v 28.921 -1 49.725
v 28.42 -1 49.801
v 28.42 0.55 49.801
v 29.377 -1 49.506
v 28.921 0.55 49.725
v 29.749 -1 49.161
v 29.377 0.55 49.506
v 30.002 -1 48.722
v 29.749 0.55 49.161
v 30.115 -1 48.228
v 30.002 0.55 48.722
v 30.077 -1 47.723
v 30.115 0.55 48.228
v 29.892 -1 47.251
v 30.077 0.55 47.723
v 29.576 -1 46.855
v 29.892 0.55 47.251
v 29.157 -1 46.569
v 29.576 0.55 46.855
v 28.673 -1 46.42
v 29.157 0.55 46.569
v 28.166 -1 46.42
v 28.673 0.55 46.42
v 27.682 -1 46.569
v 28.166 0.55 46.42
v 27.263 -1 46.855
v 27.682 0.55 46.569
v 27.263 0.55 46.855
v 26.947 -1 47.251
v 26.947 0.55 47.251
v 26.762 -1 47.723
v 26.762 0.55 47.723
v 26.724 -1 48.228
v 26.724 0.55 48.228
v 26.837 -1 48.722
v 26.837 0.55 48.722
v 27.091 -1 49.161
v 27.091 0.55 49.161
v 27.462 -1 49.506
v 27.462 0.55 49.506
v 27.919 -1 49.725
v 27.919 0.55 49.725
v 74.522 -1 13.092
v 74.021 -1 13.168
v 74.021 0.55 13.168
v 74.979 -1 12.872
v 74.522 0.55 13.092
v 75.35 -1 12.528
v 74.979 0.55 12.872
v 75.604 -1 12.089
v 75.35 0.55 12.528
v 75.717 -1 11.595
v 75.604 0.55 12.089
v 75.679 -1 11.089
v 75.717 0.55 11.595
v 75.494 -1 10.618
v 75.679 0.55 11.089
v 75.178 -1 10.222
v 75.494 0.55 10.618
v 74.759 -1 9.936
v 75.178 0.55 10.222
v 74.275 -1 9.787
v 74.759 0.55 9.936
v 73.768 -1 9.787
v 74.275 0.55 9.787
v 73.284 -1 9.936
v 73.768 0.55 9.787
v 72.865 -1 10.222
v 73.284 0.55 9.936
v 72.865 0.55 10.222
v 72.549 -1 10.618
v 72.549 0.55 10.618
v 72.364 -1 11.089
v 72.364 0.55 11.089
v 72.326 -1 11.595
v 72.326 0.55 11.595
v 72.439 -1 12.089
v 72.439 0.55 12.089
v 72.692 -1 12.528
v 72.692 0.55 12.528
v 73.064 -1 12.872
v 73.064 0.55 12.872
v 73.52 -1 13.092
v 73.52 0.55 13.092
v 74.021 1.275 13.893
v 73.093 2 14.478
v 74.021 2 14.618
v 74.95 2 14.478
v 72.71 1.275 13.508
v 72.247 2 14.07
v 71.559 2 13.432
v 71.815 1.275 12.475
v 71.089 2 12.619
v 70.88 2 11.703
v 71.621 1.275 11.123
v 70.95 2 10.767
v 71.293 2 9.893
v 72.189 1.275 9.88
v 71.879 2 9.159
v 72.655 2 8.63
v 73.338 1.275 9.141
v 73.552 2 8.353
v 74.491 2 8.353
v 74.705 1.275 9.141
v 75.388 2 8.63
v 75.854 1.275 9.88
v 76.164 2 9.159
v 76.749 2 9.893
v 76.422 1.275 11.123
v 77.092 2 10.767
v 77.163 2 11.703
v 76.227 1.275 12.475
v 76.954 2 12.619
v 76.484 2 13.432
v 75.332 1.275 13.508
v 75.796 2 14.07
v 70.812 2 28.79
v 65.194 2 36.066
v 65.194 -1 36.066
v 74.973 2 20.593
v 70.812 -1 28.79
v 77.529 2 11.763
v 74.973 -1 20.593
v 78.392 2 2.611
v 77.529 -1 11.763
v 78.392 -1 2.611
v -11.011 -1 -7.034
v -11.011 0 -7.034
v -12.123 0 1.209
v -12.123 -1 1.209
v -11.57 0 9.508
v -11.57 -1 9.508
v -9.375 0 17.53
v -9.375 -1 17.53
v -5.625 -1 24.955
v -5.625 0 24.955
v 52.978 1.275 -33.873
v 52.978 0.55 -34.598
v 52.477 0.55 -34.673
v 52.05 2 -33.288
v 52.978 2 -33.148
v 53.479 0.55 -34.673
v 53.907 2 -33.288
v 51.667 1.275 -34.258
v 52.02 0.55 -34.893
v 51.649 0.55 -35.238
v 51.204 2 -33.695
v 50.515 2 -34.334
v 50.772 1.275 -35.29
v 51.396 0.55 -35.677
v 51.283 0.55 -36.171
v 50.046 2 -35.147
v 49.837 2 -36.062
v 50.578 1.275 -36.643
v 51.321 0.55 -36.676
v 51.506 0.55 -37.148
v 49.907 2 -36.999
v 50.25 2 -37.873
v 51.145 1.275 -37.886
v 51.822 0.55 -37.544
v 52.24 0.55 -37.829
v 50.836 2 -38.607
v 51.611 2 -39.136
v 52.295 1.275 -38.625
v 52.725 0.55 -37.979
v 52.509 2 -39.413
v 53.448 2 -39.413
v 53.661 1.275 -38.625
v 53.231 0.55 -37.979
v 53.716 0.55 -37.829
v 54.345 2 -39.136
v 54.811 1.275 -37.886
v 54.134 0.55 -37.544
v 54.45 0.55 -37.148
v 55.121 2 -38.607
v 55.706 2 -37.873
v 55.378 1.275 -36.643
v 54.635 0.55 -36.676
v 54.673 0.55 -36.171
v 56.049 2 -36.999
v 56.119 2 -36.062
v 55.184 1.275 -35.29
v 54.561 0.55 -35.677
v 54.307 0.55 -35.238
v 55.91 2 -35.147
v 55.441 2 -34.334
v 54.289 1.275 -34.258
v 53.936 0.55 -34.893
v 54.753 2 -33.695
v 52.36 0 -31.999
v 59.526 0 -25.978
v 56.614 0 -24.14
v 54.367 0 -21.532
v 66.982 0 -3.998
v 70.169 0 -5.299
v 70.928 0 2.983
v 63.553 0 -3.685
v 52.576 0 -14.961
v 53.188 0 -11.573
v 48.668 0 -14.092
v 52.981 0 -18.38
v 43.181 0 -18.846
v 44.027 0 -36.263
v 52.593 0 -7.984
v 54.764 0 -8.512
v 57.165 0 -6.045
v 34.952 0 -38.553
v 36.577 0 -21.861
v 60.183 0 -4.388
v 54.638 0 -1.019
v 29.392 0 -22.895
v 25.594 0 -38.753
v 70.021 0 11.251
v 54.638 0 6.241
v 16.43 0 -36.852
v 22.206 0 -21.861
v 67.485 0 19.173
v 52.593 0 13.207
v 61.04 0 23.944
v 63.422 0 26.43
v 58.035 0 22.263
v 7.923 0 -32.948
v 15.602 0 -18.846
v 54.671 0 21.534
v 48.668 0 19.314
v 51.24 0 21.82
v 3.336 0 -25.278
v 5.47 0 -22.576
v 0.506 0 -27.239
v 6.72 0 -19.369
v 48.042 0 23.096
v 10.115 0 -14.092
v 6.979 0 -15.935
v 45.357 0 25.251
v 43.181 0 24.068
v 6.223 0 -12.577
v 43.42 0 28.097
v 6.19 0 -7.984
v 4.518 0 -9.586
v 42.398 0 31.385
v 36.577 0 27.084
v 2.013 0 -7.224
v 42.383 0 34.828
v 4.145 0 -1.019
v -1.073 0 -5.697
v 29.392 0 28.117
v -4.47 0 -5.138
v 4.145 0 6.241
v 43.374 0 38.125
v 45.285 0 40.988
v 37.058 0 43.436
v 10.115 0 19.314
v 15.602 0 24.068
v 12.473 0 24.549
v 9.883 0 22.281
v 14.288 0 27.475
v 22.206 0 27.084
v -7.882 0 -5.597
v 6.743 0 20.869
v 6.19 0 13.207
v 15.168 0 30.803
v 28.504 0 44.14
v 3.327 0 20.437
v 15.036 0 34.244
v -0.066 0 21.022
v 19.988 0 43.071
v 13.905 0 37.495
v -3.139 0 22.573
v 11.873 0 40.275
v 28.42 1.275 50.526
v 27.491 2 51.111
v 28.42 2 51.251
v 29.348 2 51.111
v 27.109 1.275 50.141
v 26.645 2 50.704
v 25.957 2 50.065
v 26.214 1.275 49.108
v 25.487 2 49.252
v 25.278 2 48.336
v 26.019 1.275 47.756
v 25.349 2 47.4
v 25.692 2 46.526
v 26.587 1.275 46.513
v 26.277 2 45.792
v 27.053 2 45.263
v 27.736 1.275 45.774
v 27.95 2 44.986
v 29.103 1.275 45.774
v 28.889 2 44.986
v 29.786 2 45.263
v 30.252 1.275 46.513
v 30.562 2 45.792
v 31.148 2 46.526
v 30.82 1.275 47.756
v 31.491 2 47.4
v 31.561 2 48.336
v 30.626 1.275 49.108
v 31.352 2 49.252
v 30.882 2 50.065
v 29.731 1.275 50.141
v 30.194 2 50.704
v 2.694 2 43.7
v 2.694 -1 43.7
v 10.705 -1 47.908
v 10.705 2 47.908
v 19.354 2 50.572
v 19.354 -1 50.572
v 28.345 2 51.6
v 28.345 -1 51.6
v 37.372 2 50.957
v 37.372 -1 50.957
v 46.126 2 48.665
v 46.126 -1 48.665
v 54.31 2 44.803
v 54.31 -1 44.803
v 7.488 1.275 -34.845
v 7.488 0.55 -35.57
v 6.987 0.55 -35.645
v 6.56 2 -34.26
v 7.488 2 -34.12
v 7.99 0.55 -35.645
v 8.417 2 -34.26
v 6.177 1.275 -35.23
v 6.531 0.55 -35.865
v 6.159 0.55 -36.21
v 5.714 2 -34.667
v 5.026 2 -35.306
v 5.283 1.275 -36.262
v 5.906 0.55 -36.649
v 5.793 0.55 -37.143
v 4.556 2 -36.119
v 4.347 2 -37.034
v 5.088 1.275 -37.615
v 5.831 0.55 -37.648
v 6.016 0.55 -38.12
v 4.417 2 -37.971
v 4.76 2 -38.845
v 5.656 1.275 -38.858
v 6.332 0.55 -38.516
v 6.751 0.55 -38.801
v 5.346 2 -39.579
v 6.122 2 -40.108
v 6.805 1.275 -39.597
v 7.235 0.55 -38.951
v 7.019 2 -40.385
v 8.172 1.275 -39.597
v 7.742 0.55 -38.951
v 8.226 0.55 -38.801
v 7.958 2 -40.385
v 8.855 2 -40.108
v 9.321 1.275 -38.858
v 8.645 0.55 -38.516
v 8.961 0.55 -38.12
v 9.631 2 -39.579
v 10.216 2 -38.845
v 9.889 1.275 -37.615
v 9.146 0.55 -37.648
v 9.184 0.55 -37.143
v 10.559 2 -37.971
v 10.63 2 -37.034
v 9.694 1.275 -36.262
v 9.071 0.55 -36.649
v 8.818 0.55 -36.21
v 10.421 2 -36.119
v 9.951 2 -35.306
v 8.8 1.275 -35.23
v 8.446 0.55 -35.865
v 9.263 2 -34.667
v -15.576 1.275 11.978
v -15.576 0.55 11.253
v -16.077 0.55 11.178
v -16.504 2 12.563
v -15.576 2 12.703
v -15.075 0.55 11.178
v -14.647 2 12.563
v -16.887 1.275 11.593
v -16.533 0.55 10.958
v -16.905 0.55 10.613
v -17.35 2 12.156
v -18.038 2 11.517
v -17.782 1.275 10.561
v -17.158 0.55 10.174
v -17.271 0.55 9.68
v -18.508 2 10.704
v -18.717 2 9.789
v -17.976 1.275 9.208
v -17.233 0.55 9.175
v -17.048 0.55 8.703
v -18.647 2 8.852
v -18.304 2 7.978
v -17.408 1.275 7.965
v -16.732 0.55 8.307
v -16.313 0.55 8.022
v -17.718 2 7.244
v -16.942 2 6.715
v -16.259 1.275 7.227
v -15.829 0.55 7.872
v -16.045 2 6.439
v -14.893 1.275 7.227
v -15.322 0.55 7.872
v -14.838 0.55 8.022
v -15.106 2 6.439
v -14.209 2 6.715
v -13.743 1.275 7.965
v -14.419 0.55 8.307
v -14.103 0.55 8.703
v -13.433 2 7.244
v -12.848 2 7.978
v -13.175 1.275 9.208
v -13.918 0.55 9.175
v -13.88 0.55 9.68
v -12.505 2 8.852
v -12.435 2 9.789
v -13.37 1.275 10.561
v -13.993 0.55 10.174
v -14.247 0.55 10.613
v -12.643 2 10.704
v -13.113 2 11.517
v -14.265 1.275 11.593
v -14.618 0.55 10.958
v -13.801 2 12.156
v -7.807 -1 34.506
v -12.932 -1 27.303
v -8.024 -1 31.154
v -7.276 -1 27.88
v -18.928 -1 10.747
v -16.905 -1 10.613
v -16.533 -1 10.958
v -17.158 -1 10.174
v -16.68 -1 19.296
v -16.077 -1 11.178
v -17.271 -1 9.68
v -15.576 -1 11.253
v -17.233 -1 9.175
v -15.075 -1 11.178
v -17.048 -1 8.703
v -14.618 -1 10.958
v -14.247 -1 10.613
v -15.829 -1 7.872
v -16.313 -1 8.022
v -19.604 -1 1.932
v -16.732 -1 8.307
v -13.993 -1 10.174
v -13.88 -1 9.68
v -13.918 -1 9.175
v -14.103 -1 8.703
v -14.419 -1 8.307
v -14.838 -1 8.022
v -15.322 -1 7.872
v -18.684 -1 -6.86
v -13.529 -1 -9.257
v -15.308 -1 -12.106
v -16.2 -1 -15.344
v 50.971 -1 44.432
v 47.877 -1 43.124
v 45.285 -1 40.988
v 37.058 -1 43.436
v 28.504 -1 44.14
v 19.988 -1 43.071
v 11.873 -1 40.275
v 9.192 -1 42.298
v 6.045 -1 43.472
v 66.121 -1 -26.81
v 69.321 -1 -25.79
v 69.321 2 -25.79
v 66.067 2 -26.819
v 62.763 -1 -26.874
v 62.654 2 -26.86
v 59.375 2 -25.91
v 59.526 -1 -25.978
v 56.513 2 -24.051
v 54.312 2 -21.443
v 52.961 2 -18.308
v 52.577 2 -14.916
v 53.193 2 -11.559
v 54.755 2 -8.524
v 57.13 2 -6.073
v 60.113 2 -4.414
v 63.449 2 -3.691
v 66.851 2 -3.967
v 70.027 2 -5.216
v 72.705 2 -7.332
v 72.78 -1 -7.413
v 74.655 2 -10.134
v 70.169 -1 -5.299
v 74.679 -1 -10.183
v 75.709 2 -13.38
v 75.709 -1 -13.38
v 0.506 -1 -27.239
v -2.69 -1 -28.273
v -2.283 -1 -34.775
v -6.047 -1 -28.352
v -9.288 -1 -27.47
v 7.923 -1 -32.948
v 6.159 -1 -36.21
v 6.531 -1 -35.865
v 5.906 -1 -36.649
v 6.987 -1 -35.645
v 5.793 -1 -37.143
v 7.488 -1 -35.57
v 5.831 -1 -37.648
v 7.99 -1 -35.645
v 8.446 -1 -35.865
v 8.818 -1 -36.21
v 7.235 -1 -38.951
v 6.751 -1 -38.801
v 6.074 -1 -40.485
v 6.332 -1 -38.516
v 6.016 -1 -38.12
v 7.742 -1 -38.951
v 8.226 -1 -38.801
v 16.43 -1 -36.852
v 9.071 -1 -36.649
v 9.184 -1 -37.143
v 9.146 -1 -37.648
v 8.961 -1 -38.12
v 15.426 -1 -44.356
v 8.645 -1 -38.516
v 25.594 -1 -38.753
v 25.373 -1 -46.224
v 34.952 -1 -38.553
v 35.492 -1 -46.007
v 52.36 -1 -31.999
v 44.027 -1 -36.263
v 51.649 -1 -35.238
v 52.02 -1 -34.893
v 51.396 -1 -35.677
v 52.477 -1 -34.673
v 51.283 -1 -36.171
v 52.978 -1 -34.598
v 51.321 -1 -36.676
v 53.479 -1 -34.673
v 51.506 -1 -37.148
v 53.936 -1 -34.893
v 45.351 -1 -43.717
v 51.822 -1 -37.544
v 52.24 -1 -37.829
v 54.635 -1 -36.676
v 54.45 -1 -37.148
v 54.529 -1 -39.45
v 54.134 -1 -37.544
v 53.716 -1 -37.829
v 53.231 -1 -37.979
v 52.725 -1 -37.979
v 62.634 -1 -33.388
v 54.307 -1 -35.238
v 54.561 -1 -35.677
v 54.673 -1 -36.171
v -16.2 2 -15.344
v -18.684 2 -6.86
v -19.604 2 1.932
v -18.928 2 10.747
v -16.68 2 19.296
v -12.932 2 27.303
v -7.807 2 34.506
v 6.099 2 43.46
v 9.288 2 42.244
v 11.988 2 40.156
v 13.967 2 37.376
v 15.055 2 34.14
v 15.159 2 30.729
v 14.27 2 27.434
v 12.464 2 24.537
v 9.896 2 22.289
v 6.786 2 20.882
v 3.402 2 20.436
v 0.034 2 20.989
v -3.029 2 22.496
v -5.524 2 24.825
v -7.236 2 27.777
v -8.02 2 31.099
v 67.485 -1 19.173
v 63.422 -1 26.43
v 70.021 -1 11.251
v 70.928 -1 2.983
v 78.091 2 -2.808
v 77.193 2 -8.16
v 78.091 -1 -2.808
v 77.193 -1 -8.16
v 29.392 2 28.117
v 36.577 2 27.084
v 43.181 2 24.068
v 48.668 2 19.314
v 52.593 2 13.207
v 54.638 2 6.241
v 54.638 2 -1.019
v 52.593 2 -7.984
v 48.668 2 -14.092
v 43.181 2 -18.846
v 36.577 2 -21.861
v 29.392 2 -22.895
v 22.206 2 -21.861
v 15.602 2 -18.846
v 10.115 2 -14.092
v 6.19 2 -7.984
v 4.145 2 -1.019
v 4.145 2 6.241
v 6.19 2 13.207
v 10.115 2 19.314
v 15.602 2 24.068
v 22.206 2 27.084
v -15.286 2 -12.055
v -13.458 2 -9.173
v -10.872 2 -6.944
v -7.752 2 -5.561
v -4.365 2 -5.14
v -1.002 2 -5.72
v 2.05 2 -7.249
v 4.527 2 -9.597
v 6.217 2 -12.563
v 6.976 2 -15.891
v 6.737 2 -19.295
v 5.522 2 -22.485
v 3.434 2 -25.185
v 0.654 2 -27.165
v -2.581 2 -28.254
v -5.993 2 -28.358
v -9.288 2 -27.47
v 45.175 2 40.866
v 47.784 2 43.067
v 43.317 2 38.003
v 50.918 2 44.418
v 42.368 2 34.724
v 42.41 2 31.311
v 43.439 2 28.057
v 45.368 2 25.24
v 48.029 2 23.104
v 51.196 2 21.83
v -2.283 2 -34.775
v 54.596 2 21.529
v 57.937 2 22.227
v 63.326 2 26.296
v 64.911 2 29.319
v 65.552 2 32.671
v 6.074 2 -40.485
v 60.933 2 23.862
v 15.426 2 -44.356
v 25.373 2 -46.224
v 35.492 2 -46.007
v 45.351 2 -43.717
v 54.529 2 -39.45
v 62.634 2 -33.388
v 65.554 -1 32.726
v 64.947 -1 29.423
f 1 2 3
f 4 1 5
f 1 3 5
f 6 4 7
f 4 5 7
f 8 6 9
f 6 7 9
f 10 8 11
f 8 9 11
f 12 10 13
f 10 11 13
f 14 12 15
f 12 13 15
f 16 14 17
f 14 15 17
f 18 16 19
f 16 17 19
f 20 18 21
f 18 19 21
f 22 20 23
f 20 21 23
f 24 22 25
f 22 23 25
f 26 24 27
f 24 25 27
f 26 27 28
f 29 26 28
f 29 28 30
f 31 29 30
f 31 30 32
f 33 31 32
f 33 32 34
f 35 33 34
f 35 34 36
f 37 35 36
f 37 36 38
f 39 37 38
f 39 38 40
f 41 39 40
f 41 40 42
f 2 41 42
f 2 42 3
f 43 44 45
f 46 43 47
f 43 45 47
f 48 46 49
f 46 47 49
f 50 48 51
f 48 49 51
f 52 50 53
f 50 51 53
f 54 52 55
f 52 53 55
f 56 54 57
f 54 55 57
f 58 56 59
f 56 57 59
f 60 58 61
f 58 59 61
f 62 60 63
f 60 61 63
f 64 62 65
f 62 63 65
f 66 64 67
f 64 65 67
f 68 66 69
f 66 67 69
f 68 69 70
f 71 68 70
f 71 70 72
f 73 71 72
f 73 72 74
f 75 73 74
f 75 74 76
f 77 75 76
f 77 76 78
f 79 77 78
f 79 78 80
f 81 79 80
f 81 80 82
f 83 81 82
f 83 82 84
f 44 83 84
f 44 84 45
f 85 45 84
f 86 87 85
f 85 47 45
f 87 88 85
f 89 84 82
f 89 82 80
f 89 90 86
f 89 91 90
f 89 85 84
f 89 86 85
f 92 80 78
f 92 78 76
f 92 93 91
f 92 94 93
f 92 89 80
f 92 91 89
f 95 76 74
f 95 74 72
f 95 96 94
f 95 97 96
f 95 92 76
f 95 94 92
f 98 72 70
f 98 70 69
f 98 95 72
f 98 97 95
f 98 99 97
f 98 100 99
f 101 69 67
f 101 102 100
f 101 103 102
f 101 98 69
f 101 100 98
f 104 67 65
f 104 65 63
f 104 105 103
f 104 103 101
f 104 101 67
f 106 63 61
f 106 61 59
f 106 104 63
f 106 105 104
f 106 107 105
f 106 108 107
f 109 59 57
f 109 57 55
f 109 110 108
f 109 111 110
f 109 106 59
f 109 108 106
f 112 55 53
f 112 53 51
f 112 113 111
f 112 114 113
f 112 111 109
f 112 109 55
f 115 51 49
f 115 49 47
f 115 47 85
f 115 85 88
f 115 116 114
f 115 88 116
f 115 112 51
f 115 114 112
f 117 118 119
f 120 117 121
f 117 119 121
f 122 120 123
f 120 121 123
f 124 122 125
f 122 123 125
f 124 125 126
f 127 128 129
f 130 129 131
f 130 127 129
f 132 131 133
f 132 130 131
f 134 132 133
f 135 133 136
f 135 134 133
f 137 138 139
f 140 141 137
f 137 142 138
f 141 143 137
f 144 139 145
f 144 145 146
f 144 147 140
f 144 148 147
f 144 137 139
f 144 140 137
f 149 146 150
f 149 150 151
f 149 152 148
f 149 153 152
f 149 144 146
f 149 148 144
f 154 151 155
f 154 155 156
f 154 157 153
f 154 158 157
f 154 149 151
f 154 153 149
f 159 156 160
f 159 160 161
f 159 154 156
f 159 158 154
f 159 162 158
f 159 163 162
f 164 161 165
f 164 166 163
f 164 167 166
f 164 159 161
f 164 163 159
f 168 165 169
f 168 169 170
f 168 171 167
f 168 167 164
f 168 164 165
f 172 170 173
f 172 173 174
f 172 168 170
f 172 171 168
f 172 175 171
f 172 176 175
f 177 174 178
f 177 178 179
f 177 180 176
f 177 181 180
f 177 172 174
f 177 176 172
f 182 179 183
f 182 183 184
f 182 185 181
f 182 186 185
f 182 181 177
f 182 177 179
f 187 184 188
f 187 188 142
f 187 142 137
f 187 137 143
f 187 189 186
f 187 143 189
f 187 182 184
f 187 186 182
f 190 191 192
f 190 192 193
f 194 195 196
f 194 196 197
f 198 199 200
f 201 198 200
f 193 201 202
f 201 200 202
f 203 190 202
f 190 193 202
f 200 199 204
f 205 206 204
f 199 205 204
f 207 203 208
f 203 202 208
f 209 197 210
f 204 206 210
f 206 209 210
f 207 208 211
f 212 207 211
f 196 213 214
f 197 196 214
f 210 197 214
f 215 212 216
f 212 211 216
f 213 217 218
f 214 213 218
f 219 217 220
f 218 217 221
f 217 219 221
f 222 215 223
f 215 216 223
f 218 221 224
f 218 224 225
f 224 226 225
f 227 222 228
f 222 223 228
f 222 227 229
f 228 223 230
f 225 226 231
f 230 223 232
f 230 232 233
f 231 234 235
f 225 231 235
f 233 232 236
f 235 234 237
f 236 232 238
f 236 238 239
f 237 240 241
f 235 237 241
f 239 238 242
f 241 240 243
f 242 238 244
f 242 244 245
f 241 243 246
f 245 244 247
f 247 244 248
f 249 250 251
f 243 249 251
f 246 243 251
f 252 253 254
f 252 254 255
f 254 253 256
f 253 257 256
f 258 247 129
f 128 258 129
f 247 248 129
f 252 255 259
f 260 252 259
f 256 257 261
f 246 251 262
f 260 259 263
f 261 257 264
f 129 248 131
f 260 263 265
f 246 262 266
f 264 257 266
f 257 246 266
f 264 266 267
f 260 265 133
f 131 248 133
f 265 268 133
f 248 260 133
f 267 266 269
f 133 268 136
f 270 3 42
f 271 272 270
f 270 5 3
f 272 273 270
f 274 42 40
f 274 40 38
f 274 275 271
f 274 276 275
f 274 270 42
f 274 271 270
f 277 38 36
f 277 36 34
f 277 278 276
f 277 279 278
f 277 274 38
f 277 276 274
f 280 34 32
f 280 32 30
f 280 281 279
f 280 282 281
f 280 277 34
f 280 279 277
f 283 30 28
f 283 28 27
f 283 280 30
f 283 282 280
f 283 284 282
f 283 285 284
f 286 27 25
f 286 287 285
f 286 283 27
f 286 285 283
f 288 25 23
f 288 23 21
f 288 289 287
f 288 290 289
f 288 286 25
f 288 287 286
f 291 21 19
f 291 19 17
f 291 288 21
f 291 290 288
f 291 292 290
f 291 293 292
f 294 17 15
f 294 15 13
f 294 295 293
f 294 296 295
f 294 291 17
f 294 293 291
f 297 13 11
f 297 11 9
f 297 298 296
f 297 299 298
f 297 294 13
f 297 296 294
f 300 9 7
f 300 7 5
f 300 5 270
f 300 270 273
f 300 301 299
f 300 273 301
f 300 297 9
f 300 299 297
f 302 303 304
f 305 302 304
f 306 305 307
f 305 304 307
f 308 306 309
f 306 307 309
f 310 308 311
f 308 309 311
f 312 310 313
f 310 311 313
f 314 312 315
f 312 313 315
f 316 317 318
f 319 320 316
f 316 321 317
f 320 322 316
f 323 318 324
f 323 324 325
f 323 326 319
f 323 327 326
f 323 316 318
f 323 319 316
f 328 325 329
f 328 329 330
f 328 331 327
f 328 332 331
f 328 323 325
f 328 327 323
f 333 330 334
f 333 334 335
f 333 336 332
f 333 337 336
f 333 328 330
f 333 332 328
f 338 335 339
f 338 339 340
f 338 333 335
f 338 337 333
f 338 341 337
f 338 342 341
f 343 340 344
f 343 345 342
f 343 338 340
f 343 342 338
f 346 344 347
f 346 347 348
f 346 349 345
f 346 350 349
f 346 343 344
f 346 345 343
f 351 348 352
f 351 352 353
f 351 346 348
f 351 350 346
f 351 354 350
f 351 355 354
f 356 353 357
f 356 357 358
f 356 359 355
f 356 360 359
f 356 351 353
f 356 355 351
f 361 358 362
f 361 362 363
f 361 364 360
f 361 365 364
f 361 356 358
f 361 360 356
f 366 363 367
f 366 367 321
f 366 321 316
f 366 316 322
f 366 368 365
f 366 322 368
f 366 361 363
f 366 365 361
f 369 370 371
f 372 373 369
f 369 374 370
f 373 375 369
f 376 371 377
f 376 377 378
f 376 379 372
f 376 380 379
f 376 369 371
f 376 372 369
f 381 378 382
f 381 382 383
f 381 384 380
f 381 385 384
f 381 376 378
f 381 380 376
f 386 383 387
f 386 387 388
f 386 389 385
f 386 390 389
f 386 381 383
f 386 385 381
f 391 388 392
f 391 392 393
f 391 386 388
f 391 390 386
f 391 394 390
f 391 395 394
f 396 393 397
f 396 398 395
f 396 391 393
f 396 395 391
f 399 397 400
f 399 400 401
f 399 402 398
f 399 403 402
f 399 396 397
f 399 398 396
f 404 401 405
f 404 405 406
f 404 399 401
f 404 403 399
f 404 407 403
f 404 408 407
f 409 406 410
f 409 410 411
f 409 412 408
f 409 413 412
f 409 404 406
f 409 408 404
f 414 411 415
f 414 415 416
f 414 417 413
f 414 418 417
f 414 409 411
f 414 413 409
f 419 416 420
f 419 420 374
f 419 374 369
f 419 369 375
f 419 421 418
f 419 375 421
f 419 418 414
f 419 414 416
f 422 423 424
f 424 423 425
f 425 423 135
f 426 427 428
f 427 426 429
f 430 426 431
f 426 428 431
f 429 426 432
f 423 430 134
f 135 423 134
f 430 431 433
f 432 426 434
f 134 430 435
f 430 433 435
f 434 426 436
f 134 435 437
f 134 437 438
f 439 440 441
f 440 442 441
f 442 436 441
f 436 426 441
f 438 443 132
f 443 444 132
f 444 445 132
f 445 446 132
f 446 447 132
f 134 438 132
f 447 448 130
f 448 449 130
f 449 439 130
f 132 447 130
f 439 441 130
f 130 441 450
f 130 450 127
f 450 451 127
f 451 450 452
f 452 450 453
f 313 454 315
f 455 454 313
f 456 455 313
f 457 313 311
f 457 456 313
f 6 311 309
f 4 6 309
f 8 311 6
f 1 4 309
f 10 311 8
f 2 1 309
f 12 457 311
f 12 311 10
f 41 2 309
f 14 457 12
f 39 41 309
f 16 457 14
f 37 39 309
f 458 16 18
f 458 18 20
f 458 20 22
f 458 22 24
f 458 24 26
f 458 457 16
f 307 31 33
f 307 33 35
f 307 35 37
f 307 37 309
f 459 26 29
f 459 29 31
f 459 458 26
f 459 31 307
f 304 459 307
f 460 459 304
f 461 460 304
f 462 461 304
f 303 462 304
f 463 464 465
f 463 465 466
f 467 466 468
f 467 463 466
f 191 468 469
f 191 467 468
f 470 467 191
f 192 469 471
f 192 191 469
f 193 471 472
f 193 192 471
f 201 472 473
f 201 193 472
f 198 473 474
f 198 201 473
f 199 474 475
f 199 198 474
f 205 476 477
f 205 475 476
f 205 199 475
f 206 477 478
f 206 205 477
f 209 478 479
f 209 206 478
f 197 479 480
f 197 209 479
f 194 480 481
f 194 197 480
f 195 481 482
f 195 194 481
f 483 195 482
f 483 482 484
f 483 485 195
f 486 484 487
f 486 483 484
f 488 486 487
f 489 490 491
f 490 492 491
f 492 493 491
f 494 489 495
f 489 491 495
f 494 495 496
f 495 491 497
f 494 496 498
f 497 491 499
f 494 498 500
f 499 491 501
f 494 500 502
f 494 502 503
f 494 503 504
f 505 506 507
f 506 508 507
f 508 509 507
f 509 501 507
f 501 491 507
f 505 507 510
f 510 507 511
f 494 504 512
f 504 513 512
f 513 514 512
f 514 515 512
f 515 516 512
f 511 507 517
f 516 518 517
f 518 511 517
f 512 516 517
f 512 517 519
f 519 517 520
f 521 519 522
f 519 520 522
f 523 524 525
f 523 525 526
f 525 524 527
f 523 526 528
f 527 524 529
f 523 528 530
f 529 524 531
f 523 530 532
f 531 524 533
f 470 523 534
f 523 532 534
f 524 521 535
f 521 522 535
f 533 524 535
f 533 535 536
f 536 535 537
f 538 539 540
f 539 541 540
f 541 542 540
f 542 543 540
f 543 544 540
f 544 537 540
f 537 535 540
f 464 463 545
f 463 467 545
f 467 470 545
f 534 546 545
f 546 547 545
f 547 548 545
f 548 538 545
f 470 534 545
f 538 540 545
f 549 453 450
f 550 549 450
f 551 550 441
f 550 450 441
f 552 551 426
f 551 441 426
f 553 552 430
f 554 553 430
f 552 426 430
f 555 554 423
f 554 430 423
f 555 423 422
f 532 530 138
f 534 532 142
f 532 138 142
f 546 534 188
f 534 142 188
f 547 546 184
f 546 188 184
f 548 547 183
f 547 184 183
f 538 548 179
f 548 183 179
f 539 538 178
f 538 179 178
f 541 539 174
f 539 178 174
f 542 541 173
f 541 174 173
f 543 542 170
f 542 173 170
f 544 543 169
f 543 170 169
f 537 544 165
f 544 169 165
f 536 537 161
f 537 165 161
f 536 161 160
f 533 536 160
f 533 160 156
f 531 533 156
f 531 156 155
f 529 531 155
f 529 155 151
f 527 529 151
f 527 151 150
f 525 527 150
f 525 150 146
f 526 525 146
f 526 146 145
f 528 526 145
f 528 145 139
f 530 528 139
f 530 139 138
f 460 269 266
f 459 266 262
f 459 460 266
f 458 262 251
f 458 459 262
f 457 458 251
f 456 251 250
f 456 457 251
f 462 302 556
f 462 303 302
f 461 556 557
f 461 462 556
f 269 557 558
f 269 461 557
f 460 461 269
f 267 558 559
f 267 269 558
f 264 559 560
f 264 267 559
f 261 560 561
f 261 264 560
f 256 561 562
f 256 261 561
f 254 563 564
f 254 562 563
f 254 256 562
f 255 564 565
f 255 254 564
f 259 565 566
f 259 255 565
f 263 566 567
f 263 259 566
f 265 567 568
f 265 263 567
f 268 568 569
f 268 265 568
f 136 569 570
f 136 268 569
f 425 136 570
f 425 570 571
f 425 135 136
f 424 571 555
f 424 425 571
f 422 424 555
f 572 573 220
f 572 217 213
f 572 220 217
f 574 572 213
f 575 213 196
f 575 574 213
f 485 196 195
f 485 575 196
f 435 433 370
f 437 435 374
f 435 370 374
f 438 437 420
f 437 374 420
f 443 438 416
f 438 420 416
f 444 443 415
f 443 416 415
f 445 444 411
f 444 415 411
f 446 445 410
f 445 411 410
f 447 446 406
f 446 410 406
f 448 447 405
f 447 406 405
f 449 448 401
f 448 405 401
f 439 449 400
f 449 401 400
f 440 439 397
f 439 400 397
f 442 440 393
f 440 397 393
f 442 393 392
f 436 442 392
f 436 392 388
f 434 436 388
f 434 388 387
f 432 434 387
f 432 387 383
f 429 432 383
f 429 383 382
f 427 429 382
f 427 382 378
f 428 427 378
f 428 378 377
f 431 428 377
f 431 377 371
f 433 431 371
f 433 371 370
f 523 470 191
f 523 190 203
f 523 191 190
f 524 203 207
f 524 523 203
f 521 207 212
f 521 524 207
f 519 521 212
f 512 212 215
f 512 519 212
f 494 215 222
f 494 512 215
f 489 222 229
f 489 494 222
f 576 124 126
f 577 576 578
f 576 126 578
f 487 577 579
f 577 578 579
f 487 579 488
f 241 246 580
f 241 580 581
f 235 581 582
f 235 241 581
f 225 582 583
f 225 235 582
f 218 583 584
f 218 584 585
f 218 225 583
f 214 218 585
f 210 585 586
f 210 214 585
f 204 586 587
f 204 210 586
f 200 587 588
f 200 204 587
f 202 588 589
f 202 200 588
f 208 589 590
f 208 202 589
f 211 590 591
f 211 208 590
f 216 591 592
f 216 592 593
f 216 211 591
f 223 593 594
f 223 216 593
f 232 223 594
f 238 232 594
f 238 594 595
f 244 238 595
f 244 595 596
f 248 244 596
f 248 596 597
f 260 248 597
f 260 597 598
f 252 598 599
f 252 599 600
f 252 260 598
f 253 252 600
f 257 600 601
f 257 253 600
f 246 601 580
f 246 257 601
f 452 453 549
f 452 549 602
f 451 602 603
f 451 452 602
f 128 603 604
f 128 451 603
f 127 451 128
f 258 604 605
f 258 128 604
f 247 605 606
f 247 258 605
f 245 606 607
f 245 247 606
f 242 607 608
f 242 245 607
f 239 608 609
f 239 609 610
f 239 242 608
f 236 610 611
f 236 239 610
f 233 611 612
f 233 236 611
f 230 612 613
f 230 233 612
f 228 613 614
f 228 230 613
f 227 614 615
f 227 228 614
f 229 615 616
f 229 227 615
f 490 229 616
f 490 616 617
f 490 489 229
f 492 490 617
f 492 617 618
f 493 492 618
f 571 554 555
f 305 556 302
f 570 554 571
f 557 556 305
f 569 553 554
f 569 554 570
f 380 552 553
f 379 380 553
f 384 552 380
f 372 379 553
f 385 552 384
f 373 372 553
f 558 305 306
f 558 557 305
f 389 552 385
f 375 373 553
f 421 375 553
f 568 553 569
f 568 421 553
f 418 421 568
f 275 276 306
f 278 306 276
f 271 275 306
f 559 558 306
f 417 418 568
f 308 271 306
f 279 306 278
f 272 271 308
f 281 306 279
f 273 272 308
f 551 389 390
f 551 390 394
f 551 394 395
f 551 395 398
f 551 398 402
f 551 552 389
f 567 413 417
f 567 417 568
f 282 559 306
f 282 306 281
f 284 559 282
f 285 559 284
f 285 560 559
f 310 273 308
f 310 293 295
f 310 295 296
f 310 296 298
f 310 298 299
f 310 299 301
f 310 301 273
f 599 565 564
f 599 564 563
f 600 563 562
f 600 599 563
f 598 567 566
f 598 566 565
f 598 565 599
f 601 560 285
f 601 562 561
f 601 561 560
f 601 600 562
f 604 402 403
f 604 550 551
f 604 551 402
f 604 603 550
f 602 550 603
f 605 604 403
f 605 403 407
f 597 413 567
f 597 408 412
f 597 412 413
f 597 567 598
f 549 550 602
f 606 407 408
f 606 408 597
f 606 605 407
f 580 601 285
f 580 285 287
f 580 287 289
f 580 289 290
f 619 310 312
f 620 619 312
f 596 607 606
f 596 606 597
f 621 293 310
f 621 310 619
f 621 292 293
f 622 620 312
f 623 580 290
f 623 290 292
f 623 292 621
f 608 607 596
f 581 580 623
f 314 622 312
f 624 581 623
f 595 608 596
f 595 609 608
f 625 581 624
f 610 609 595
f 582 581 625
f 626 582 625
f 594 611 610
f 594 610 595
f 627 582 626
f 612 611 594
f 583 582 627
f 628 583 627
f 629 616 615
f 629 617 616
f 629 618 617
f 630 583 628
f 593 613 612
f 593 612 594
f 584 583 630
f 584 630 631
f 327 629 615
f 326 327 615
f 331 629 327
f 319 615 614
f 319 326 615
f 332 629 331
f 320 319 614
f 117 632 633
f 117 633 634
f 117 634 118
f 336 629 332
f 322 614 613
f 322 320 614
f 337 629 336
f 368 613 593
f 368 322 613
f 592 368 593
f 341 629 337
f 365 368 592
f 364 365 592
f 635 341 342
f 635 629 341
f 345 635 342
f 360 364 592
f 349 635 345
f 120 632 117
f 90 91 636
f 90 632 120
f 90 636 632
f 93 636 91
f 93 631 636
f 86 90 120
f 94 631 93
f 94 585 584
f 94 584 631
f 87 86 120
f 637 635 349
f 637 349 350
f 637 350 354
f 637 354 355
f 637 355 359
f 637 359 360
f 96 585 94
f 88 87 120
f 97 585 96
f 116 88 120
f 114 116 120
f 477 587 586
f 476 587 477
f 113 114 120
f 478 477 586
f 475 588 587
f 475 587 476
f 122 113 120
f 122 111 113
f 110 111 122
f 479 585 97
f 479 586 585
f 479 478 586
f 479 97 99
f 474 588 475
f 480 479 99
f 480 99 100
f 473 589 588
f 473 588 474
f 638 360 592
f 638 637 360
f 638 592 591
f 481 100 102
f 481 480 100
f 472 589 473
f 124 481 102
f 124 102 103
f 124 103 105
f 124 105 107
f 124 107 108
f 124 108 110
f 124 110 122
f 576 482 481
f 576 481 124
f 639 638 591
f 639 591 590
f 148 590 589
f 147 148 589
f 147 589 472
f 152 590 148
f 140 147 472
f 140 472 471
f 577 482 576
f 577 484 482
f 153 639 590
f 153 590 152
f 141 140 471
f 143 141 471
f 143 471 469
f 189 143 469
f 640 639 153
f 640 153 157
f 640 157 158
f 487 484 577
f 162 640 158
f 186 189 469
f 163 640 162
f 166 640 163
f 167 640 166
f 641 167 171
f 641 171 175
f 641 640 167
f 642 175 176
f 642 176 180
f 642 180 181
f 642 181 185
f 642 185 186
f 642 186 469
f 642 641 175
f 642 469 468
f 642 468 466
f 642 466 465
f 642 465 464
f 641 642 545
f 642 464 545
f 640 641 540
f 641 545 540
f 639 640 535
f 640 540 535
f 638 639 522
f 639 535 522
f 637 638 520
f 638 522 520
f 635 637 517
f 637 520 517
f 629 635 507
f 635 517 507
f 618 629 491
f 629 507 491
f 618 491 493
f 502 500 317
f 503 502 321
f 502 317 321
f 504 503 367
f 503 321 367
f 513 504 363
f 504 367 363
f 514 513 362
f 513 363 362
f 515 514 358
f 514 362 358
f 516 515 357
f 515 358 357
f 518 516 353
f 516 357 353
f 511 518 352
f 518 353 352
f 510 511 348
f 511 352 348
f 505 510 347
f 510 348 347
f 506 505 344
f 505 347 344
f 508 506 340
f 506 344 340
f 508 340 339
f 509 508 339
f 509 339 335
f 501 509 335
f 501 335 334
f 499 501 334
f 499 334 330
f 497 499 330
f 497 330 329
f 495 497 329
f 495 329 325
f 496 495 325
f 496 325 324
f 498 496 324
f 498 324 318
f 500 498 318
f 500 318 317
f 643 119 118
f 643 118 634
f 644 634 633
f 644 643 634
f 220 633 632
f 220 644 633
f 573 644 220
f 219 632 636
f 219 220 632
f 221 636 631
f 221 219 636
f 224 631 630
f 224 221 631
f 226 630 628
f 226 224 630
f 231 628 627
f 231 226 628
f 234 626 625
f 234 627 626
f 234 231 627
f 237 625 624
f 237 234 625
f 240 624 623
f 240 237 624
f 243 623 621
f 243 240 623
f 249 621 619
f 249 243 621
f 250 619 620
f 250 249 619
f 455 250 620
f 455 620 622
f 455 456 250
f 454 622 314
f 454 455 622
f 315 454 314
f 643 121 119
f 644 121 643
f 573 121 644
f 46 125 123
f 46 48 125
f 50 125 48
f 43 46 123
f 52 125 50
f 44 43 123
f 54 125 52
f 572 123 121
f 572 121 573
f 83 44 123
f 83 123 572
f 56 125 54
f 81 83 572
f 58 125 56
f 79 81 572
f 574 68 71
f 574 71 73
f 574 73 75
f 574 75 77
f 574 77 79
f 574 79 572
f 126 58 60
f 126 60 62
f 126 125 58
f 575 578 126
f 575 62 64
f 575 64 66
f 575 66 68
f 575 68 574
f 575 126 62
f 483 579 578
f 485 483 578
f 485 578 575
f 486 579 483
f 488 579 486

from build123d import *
from build123d.topology import SkipClean

# Parameters (mm, degrees)
SKETCH1_R                                      = 25.506
BOSS_EXTRUDE1_DEPTH                            = 2
BOSS_EXTRUDE2_START                            = -3
BOSS_EXTRUDE2_DEPTH                            = 3
BOSS_EXTRUDE6_START                            = -3
BOSS_EXTRUDE6_DEPTH                            = 3
SKETCH25_R                                     = 1.7
CUT_EXTRUDE16_DEPTH                            = 95.198280418
CSK_FOR_M3_FLAT_HEAD_MACHINE_SCREW1_AT_2_COUNT = 2
CSK_FOR_M3_FLAT_HEAD_MACHINE_SCREW1_AT_2_PITCH = 45.5
CSK_FOR_M3_FLAT_HEAD_MACHINE_SCREW1_AT_3_COUNT = 2
CSK_FOR_M3_FLAT_HEAD_MACHINE_SCREW1_AT_3_PITCH = 82.47400862
CSK_FOR_M3_FLAT_HEAD_MACHINE_SCREW1_AT_4_COUNT = 2
CSK_FOR_M3_FLAT_HEAD_MACHINE_SCREW1_AT_4_PITCH = 87.899250192
CSK_FOR_M3_FLAT_HEAD_MACHINE_SCREW1_AT_5_COUNT = 2
CSK_FOR_M3_FLAT_HEAD_MACHINE_SCREW1_AT_5_PITCH = 52.195455708
CUT_EXTRUDE18_START                            = -10
SKETCH38_R                                     = 11.65
SKETCH38_R_2                                   = 10.65
CUT_EXTRUDE18_DEPTH                            = 10


with BuildPart() as part:
    # Sketch1 → Boss-Extrude1 (new body)
    with BuildSketch(Plane(origin=(0, 0, 0), x_dir=(-1, 0, 0), z_dir=(0, 1, 0))):
        with BuildLine():
            ThreePointArc((-61.273022956, -25.549853724), (-30.300207038, -39.91692623), (1.257982902, -26.885857738))
            ThreePointArc((1.257982902, -26.885857738), (-4.612463385, -11.513091013), (11.606251263, -8.731474296))
            ThreePointArc((11.606251263, -8.731474296), (12.556026093, 9.673988398), (5.631693186, 26.753705697))
            ThreePointArc((5.631693186, 26.753705697), (-10.603691781, 24.071100363), (-10.090754324, 40.518622716))
            ThreePointArc((-10.090754324, 40.518622716), (-28.482933471, 45.139662538), (-47.055700073, 41.308395969))
            ThreePointArc((-47.055700073, 41.308395969), (-47.245727944, 24.853974503), (-63.351719399, 28.227568381))
            ThreePointArc((-63.351719399, 28.227568381), (-70.999232707, 11.459185352), (-70.836448279, -6.970047687))
            ThreePointArc((-70.836448279, -6.970047687), (-54.751340848, -10.441850583), (-61.273022956, -25.549853724))
        make_face()
        with Locations(Location((-29.391570254, 2.611368154, 0), (0, 0, 90))):
            Circle(SKETCH1_R, mode=Mode.SUBTRACT)
    extrude(amount=BOSS_EXTRUDE1_DEPTH)

    # Sketch2 → Boss-Extrude2 (add)
    with SkipClean():  # the faces are left unmerged after this step: merging them gives an invalid solid
        with BuildSketch(Plane(origin=(0, 2, 0), x_dir=(1, 0, 0), z_dir=(0, 1, 0)).offset(BOSS_EXTRUDE2_START)):
            with BuildLine():
                ThreePointArc((8.100781322, -41.730874166), (9.584878111, -40.885466148), (10.914743148, -39.813683997))
                ThreePointArc((10.914743148, -39.813683997), (28.504294061, -44.139890701), (46.262572123, -40.568906798))
                ThreePointArc((46.262572123, -40.568906798), (47.545446241, -41.696511336), (48.99208013, -42.604535778))
                ThreePointArc((48.99208013, -42.604535778), (28.44021229, -47.139206211), (8.100781322, -41.730874166))
            make_face()
            with BuildLine():
                ThreePointArc((64.198332324, -30.398465127), (63.624713683, -28.789670656), (62.801291616, -27.293263594))
                ThreePointArc((62.801291616, -27.293263594), (70.021103448, -11.251187393), (69.953480433, 6.340552681))
                ThreePointArc((69.953480433, 6.340552681), (71.314539545, 7.372432563), (72.493139985, 8.608619846))
                ThreePointArc((72.493139985, 8.608619846), (72.955491227, -11.875181271), (64.198332324, -30.398465127))
            make_face()
            with BuildLine():
                ThreePointArc((63.569251617, 25.945934601), (61.87831648, 25.705110274), (60.247624932, 25.197071819))
                ThreePointArc((60.247624932, 25.197071819), (30.278846447, 38.917154393), (-0.248588426, 26.489601545))
                ThreePointArc((-0.248588426, 26.489601545), (-1.856092836, 27.066825563), (-3.535198959, 27.379652388))
                ThreePointArc((-3.535198959, 27.379652388), (30.342928218, 41.916469903), (63.569251617, 25.945934601))
            make_face()
            with BuildLine():
                ThreePointArc((-5.0418622, -25.843763068), (-5.928446542, -27.303635049), (-6.570255645, -28.886461341))
                ThreePointArc((-6.570255645, -28.886461341), (-14.528267211, -10.006050096), (-13.191445392, 10.439310852))
                ThreePointArc((-13.191445392, 10.439310852), (-12.066719813, 9.153911938), (-10.750975803, 8.064840913))
                ThreePointArc((-10.750975803, 8.064840913), (-11.569905534, -9.50795755), (-5.0418622, -25.843763068))
            make_face()
        extrude(amount=BOSS_EXTRUDE2_DEPTH)

    # Sketch24 → Boss-Extrude6 (add)
    with SkipClean():  # the faces are left unmerged after this step: merging them gives an invalid solid
        with BuildSketch(Plane(origin=(0, 2, 0), x_dir=(1, 0, 0), z_dir=(0, 1, 0)).offset(BOSS_EXTRUDE6_START)):
            with BuildLine():
                ThreePointArc((70.669999692, 23.791117773), (30.438076993, 46.377455303), (-10.721688888, 25.529819472))
                ThreePointArc((-10.721688888, 25.529819472), (-7.294770946, 27.100906435), (-3.535198959, 27.379652388))
                ThreePointArc((-3.535198959, 27.379652388), (30.342885438, 41.916470817), (63.569196745, 25.946000272))
                ThreePointArc((63.569196745, 25.946000272), (67.313347493, 25.5070047), (70.669999692, 23.791117773))
            make_face()
            with BuildLine():
                ThreePointArc((-13.191445392, 10.439310852), (-14.8672068, 13.816277617), (-15.261471823, 17.565495658))
                ThreePointArc((-15.261471823, 17.565495658), (-18.928337146, -10.746879743), (-6.19266673, -36.297597956))
                ThreePointArc((-6.19266673, -36.297597956), (-7.047830714, -32.625980412), (-6.570255645, -28.886461341))
                ThreePointArc((-6.570255645, -28.886461341), (-14.528267211, -10.006050096), (-13.191445392, 10.439310852))
            make_face()
            with BuildLine():
                ThreePointArc((78.391570254, -2.611368154), (77.502051415, 6.682802197), (74.86579056, 15.639530113))
                ThreePointArc((74.86579056, 15.639530113), (74.31165682, 11.910680729), (72.493175524, 8.608483323))
                ThreePointArc((72.493175524, 8.608483323), (72.955476555, -11.875250265), (64.198332324, -30.398465127))
                ThreePointArc((64.198332324, -30.398465127), (64.515751364, -34.154969617), (63.504547713, -37.786711349))
                ThreePointArc((63.504547713, -37.786711349), (74.516595991, -21.709327528), (78.391570254, -2.611368154))
            make_face()
            with BuildLine():
                ThreePointArc((8.100781322, -41.730874166), (4.457207722, -42.698578795), (0.704767353, -42.336263866))
                ThreePointArc((0.704767353, -42.336263866), (28.344901337, -51.600188146), (56.355487807, -43.525267384))
                ThreePointArc((56.355487807, -43.525267384), (52.590996737, -43.726979578), (48.99208013, -42.604535778))
                ThreePointArc((48.99208013, -42.604535778), (28.44021229, -47.139206211), (8.100781322, -41.730874166))
            make_face()
        extrude(amount=BOSS_EXTRUDE6_DEPTH)

    # Sketch25 → Cut-Extrude16 (cut, through all)
    with SkipClean():  # the faces are left unmerged after this step: merging them gives an invalid solid
        with BuildSketch(Plane(origin=(0.062486446, 2, -0.627225467), x_dir=(-0.9997718365651259, 0, -0.02136059014154422), z_dir=(0, 1, 0))):
            with Locations(Location((-29.391570254, 48.111368154, 0), (0, 0, 91.223964752))):
                Circle(SKETCH25_R)
            with Locations(Location((-74.200323016, 10.512360238, 0), (0, 0, 91.223964752))):
                Circle(SKETCH25_R)
            with Locations(Location((-52.141570254, -36.792787718, 0), (0, 0, 91.223964752))):
                Circle(SKETCH25_R)
            with Locations(Location((-6.641570254, -36.792787718, 0), (0, 0, 91.223964752))):
                Circle(SKETCH25_R)
            with Locations(Location((15.417182508, 10.512360238, 0), (0, 0, 91.223964752))):
                Circle(SKETCH25_R)
        extrude(amount=-CUT_EXTRUDE16_DEPTH, mode=Mode.SUBTRACT)

    # Sketch35 → CSK for M3 Flat Head Machine Screw1 (revolve, cut)
    with SkipClean():  # the faces are left unmerged after this step: merging them gives an invalid solid
        with BuildSketch(Plane(origin=(7.488456996, 2, -37.269750556), x_dir=(0, 0, 1), z_dir=(1, 0, 0))):
            Polygon((0, 0), (0, 3), (1.7, 3), (1.7, 1.45), (3.15, 0), align=None)
        csk_for_m3_flat_head_machine_screw1 = revolve(axis=Axis((7.488456996, 8.35, -37.269750556), (0, -1, 0)), mode=Mode.SUBTRACT)

    # CSK for M3 Flat Head Machine Screw1 at 2: CSK for M3 Flat Head Machine Screw1 ×2
    with SkipClean():  # the faces are left unmerged after this step: merging them gives an invalid solid
        with Locations(*[Vector(0.999771836565126, 0, 0.021360590141544296) * (i * CSK_FOR_M3_FLAT_HEAD_MACHINE_SCREW1_AT_2_PITCH) for i in range(1, CSK_FOR_M3_FLAT_HEAD_MACHINE_SCREW1_AT_2_COUNT)]):
            add(csk_for_m3_flat_head_machine_screw1, mode=Mode.SUBTRACT)

    # CSK for M3 Flat Head Machine Screw1 at 3: CSK for M3 Flat Head Machine Screw1 ×2
    with SkipClean():  # the faces are left unmerged after this step: merging them gives an invalid solid
        with Locations(*[Vector(0.8067132125731439, 0, 0.5909431382628263) * (i * CSK_FOR_M3_FLAT_HEAD_MACHINE_SCREW1_AT_3_PITCH) for i in range(1, CSK_FOR_M3_FLAT_HEAD_MACHINE_SCREW1_AT_3_COUNT)]):
            add(csk_for_m3_flat_head_machine_screw1, mode=Mode.SUBTRACT)

    # CSK for M3 Flat Head Machine Screw1 at 4: CSK for M3 Flat Head Machine Screw1 ×2
    with SkipClean():  # the faces are left unmerged after this step: merging them gives an invalid solid
        with Locations(*[Vector(0.23812724637768845, 0, 0.9712339648779689) * (i * CSK_FOR_M3_FLAT_HEAD_MACHINE_SCREW1_AT_4_PITCH) for i in range(1, CSK_FOR_M3_FLAT_HEAD_MACHINE_SCREW1_AT_4_COUNT)]):
            add(csk_for_m3_flat_head_machine_screw1, mode=Mode.SUBTRACT)

    # CSK for M3 Flat Head Machine Screw1 at 5: CSK for M3 Flat Head Machine Screw1 ×2
    with SkipClean():  # the faces are left unmerged after this step: merging them gives an invalid solid
        with Locations(*[Vector(-0.44188110488744076, 0, 0.8970736252635313) * (i * CSK_FOR_M3_FLAT_HEAD_MACHINE_SCREW1_AT_5_PITCH) for i in range(1, CSK_FOR_M3_FLAT_HEAD_MACHINE_SCREW1_AT_5_COUNT)]):
            add(csk_for_m3_flat_head_machine_screw1, mode=Mode.SUBTRACT)

    # Sketch38 → Cut-Extrude18 (cut)
    # profile 1 of 4: a face of its own
    with BuildSketch(Plane(origin=(0, 2, 0), x_dir=(1, 0, 0), z_dir=(0, 1, 0)).offset(CUT_EXTRUDE18_START)):
        with Locations((-4.639955385, 16.787107215)):
            Circle(SKETCH38_R)
        with Locations((-4.639955385, 16.787107215)):
            Circle(SKETCH38_R_2, mode=Mode.SUBTRACT)
    # profile 2 of 4: a face of its own
    with BuildSketch(Plane(origin=(0, 2, 0), x_dir=(1, 0, 0), z_dir=(0, 1, 0)).offset(CUT_EXTRUDE18_START)):
        with Locations((64.220577116, 15.315869921)):
            Circle(SKETCH38_R)
        with Locations((64.220577116, 15.315869921)):
            Circle(SKETCH38_R_2, mode=Mode.SUBTRACT)
    # profile 3 of 4: a face of its own
    with BuildSketch(Plane(origin=(0, 2, 0), x_dir=(1, 0, 0), z_dir=(0, 1, 0)).offset(CUT_EXTRUDE18_START)):
        with Locations((53.912398563, -33.159274187)):
            Circle(SKETCH38_R)
        with Locations((53.912398563, -33.159274187)):
            Circle(SKETCH38_R_2, mode=Mode.SUBTRACT)
    # profile 4 of 4: a face of its own
    with BuildSketch(Plane(origin=(0, 2, 0), x_dir=(1, 0, 0), z_dir=(0, 1, 0)).offset(CUT_EXTRUDE18_START)):
        with Locations((3.58837358, -32.084077995)):
            Circle(SKETCH38_R)
        with Locations((3.58837358, -32.084077995)):
            Circle(SKETCH38_R_2, mode=Mode.SUBTRACT)
    extrude(amount=CUT_EXTRUDE18_DEPTH, mode=Mode.SUBTRACT)


solid = part.part
